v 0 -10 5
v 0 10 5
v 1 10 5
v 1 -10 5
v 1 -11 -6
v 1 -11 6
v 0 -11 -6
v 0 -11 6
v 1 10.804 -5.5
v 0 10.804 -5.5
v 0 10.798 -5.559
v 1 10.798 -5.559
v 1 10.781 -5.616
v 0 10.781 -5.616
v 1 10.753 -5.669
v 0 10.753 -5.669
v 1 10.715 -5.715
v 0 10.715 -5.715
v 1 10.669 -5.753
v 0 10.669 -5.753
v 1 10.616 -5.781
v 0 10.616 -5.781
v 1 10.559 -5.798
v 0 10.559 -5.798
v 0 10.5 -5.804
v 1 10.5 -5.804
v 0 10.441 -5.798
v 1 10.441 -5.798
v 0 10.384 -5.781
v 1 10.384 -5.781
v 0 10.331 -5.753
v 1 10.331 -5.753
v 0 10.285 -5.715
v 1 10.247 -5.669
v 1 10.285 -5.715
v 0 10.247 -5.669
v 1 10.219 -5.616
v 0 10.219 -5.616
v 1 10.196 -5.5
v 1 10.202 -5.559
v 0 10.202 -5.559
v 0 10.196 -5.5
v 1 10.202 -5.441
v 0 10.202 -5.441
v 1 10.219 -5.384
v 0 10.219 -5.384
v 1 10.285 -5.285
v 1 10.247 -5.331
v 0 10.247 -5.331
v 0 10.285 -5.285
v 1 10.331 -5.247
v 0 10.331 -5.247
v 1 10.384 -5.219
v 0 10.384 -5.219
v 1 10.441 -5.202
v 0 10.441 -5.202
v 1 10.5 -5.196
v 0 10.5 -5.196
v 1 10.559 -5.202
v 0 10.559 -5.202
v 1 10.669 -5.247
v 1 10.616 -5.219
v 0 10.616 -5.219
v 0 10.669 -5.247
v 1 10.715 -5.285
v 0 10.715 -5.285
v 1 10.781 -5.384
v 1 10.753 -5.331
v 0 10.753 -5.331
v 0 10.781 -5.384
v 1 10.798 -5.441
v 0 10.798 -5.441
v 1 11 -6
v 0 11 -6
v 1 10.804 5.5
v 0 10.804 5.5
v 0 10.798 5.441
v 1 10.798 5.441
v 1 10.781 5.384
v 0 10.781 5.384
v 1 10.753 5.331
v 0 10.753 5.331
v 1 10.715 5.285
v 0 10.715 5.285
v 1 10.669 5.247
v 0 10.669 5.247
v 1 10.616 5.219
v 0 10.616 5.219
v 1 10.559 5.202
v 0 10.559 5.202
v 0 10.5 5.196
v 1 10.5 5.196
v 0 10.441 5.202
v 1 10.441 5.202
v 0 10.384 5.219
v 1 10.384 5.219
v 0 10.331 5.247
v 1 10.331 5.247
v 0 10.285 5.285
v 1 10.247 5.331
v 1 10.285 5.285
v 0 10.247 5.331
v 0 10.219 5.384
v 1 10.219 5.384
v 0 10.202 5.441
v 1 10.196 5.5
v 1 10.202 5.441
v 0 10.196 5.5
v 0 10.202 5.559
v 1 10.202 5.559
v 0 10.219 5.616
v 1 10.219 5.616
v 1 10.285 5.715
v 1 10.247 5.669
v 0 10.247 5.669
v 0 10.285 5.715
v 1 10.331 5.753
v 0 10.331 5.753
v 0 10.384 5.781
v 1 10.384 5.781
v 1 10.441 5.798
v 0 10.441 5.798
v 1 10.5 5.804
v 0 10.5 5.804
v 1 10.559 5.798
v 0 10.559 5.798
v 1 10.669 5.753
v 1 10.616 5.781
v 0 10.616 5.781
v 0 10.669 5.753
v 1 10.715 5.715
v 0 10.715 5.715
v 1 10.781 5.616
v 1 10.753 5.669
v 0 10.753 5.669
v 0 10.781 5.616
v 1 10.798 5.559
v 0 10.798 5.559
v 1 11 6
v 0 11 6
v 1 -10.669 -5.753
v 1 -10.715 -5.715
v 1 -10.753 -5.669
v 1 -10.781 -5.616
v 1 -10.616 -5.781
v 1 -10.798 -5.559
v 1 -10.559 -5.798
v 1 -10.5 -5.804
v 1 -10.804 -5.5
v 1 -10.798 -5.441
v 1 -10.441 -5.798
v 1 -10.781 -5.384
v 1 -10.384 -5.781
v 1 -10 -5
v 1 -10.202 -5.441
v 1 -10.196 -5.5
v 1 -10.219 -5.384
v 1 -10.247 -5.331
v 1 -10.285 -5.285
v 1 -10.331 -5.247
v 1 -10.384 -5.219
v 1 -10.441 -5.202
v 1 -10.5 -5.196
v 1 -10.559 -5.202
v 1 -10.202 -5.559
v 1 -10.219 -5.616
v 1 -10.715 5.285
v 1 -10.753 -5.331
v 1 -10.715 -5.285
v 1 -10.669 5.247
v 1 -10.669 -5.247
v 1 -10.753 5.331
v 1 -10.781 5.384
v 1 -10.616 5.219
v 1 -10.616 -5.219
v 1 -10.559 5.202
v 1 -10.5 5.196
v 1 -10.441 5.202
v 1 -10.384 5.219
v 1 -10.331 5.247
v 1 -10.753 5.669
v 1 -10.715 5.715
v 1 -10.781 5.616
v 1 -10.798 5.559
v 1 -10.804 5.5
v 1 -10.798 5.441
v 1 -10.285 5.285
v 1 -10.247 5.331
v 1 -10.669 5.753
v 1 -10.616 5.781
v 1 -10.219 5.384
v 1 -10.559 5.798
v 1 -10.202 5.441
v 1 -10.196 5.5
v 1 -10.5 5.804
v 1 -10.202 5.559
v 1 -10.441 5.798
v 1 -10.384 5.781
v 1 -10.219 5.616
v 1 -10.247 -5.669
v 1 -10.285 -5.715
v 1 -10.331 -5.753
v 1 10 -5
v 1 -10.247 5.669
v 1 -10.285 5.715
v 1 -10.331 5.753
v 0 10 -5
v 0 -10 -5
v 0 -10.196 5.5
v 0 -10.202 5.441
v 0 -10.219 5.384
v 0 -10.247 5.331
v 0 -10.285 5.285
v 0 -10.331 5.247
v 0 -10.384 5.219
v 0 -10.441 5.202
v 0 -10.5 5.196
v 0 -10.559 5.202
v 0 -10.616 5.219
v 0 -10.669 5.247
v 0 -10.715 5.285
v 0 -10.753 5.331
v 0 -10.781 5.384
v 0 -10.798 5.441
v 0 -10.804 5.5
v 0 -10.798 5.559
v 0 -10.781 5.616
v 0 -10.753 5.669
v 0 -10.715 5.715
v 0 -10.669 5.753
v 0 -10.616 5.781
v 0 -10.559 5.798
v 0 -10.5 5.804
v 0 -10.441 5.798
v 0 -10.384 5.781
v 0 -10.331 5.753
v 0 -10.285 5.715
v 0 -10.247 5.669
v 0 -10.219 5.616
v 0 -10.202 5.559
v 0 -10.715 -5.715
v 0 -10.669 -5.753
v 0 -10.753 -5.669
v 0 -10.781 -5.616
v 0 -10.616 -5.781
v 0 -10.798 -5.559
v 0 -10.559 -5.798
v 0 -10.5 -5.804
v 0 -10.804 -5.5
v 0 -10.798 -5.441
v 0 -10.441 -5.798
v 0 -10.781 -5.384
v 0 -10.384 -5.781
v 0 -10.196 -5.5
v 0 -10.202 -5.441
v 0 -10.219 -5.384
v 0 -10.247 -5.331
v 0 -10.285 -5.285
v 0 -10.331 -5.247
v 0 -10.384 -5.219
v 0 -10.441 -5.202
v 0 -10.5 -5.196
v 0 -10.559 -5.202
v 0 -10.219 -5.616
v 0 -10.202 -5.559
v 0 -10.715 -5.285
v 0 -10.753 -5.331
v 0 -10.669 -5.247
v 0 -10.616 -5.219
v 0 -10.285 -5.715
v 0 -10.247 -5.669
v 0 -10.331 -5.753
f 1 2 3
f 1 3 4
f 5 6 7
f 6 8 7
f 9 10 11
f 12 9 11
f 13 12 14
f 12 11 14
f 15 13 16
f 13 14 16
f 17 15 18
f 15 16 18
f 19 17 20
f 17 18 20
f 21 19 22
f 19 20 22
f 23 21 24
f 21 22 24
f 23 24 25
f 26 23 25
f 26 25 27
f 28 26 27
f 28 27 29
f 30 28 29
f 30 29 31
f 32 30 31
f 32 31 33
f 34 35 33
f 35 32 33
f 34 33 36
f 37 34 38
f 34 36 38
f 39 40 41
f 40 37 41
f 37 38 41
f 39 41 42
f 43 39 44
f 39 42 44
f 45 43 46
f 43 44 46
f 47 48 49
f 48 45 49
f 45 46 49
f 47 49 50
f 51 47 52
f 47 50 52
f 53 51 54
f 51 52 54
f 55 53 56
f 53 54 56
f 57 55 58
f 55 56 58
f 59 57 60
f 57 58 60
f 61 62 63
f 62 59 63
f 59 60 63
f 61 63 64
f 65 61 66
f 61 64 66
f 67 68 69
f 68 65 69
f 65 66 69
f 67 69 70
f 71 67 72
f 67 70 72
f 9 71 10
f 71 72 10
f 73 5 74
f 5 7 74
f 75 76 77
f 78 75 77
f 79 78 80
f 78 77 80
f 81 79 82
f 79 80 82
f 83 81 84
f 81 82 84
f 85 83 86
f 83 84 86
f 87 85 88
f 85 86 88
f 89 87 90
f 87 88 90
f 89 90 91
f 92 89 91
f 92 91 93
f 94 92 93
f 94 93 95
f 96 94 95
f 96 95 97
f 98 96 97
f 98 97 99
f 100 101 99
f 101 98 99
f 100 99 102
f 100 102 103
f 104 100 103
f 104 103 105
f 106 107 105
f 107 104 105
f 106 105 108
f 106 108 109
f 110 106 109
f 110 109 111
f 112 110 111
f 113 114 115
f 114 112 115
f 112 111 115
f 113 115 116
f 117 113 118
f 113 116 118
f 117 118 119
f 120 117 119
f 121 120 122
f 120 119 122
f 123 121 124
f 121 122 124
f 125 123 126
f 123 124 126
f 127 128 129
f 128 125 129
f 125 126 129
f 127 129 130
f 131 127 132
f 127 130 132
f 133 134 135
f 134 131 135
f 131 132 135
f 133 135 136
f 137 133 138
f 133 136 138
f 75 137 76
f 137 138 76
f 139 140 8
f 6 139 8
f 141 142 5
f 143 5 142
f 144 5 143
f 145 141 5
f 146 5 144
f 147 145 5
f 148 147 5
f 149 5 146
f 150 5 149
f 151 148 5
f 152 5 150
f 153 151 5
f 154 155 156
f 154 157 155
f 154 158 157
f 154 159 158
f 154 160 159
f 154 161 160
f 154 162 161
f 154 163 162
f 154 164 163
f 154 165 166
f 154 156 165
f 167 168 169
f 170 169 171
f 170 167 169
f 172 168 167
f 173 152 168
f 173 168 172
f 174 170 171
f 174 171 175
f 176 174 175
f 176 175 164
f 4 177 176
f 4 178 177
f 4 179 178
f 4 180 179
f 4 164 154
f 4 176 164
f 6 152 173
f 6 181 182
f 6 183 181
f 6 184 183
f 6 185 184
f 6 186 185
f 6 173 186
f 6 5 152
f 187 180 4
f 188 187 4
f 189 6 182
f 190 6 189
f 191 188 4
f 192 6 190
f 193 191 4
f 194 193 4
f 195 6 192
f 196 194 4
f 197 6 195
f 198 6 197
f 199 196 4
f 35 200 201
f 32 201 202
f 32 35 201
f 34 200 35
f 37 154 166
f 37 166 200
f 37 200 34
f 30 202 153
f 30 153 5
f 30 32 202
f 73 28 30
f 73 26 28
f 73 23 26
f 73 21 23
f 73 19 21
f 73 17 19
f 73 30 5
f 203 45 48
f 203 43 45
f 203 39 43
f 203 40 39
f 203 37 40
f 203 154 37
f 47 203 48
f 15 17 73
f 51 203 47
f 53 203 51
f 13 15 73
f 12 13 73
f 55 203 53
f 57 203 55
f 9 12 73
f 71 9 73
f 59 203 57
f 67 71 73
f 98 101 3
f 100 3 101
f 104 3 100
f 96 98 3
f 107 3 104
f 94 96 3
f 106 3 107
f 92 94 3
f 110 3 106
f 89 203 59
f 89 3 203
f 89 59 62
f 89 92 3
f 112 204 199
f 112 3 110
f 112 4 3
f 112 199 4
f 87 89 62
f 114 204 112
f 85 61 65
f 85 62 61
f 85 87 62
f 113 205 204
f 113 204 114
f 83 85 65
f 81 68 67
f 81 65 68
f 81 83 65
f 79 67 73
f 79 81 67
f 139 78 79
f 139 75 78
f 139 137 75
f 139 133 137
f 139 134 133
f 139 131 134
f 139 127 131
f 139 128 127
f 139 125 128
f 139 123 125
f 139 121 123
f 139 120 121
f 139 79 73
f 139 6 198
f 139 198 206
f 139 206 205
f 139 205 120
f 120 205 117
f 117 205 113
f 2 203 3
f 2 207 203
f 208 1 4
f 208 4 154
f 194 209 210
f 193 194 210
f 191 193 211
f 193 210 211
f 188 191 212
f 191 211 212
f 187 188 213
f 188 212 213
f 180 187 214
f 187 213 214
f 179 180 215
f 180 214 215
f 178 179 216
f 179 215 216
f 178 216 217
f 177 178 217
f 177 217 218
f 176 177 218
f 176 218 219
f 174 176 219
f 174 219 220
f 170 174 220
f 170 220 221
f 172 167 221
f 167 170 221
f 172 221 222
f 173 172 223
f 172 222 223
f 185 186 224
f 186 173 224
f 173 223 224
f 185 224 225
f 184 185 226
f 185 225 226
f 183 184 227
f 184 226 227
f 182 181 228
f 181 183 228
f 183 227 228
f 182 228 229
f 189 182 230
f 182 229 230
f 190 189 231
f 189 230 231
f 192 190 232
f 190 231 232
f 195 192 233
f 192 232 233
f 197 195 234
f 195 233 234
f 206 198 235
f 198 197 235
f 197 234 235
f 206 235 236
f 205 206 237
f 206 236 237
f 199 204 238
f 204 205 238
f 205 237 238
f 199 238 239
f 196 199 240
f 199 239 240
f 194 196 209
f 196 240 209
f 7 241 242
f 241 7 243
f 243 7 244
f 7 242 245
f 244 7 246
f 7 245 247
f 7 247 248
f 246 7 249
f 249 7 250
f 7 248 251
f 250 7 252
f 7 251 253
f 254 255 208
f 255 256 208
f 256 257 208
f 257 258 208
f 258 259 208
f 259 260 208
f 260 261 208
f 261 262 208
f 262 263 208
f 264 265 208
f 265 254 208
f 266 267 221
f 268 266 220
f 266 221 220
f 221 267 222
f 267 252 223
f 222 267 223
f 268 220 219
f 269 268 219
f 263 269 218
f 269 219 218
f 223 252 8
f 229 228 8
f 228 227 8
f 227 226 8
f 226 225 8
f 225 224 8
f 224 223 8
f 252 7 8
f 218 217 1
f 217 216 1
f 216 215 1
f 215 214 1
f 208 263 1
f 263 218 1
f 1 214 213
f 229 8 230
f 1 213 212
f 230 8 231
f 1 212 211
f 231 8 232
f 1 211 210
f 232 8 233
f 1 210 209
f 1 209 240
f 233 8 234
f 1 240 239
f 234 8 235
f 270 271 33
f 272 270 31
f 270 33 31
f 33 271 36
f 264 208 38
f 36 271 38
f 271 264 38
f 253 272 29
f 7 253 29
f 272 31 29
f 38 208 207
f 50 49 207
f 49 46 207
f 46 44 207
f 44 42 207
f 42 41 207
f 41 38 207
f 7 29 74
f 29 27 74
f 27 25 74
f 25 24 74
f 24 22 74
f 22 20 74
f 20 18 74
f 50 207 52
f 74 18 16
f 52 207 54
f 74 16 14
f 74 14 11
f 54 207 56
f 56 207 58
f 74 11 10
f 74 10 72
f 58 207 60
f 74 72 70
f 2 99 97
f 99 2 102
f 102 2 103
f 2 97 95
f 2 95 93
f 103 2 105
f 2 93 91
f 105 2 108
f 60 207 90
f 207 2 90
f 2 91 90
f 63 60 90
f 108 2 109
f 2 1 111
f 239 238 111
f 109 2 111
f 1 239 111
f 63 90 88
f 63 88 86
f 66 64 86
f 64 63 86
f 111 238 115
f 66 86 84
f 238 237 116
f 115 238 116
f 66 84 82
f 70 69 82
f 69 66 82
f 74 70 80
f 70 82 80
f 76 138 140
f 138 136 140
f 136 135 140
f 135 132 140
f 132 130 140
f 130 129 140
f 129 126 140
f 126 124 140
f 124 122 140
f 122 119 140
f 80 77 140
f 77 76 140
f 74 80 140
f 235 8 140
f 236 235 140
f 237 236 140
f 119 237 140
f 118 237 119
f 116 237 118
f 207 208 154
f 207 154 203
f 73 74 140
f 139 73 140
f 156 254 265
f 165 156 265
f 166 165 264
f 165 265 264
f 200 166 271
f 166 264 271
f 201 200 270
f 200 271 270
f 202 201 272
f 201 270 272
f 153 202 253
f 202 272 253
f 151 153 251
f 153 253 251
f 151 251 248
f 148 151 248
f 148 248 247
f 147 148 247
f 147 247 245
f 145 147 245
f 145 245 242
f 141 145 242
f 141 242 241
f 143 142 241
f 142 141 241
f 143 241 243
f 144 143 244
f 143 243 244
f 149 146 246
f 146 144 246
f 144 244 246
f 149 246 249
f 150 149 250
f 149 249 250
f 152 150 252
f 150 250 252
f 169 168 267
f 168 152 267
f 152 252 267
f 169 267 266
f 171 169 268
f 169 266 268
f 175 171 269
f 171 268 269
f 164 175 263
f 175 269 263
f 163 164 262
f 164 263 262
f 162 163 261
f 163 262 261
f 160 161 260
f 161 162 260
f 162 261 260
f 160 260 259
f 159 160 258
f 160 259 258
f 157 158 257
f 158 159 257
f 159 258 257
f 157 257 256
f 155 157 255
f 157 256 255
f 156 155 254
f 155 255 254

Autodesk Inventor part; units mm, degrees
ref_plane "YZ Plane" through (0, 0, 0) normal (1, 0, 0) x (0, 1, 0)
ref_plane "XZ Plane" through (0, 0, 0) normal (0, 1, 0) x (-1, 0, 0)
ref_plane "XY Plane" through (0, 0, 0) normal (0, 0, 1) x (1, 0, 0)
sketch "Esquisse1" plane through (0, 0, 0) normal (1, 0, 0) x (0, 1, 0)
  line L0 (10, 5) -> (-10, 5)
  line L1 (-10, 5) -> (-10, -5)
  line L2 (-10, -5) -> (10, -5)
  line L3 (10, -5) -> (10, 5)
  line L4 (10, 5) -> (-10, -5) construction
  line L5 (-10, 5) -> (10, -5) construction
  line L6 (11, 6) -> (-11, 6)
  line L7 (-11, 6) -> (-11, -6)
  line L8 (-11, -6) -> (11, -6)
  line L9 (11, -6) -> (11, 6)
  line L10 (11, 6) -> (-11, -6) construction
  line L11 (-11, 6) -> (11, -6) construction
  line L12 (-11, 6) -> (-10, 5) construction
  circle A0 centre (-10.5, 5.5) radius 0.3042
  line L13 (-10, -5) -> (-11, -6) construction
  circle A1 centre (-10.5, -5.5) radius 0.3042
  line L14 (0, 12.1344) -> (0, -11.0693) construction
  line L15 (0, -11.0693) -> (0, -10.4091)
  line L16 (10, 5) -> (11, 6) construction
  line L17 (10, -5) -> (11, -6) construction
  circle A2 centre (10.5, 5.5) radius 0.3042
  circle A3 centre (10.5, -5.5) radius 0.3042
  point P0 (0, 0)
  point P1 (0, 0)
  point P2 (0, 0)
  dimension "d0" = 10
  dimension "d1" = 20
  dimension "d2" = 22
  dimension "d3" = 12
  dimension "d4" = 0.6083
  dimension "d5" = 0.6083
  dimension "d6" = 0.6083
  dimension "d7" = 0.6083
extrude "Extrusion1" add sketch "Esquisse1" along normal blind 1
properties part number "Cadre encoche manette"
